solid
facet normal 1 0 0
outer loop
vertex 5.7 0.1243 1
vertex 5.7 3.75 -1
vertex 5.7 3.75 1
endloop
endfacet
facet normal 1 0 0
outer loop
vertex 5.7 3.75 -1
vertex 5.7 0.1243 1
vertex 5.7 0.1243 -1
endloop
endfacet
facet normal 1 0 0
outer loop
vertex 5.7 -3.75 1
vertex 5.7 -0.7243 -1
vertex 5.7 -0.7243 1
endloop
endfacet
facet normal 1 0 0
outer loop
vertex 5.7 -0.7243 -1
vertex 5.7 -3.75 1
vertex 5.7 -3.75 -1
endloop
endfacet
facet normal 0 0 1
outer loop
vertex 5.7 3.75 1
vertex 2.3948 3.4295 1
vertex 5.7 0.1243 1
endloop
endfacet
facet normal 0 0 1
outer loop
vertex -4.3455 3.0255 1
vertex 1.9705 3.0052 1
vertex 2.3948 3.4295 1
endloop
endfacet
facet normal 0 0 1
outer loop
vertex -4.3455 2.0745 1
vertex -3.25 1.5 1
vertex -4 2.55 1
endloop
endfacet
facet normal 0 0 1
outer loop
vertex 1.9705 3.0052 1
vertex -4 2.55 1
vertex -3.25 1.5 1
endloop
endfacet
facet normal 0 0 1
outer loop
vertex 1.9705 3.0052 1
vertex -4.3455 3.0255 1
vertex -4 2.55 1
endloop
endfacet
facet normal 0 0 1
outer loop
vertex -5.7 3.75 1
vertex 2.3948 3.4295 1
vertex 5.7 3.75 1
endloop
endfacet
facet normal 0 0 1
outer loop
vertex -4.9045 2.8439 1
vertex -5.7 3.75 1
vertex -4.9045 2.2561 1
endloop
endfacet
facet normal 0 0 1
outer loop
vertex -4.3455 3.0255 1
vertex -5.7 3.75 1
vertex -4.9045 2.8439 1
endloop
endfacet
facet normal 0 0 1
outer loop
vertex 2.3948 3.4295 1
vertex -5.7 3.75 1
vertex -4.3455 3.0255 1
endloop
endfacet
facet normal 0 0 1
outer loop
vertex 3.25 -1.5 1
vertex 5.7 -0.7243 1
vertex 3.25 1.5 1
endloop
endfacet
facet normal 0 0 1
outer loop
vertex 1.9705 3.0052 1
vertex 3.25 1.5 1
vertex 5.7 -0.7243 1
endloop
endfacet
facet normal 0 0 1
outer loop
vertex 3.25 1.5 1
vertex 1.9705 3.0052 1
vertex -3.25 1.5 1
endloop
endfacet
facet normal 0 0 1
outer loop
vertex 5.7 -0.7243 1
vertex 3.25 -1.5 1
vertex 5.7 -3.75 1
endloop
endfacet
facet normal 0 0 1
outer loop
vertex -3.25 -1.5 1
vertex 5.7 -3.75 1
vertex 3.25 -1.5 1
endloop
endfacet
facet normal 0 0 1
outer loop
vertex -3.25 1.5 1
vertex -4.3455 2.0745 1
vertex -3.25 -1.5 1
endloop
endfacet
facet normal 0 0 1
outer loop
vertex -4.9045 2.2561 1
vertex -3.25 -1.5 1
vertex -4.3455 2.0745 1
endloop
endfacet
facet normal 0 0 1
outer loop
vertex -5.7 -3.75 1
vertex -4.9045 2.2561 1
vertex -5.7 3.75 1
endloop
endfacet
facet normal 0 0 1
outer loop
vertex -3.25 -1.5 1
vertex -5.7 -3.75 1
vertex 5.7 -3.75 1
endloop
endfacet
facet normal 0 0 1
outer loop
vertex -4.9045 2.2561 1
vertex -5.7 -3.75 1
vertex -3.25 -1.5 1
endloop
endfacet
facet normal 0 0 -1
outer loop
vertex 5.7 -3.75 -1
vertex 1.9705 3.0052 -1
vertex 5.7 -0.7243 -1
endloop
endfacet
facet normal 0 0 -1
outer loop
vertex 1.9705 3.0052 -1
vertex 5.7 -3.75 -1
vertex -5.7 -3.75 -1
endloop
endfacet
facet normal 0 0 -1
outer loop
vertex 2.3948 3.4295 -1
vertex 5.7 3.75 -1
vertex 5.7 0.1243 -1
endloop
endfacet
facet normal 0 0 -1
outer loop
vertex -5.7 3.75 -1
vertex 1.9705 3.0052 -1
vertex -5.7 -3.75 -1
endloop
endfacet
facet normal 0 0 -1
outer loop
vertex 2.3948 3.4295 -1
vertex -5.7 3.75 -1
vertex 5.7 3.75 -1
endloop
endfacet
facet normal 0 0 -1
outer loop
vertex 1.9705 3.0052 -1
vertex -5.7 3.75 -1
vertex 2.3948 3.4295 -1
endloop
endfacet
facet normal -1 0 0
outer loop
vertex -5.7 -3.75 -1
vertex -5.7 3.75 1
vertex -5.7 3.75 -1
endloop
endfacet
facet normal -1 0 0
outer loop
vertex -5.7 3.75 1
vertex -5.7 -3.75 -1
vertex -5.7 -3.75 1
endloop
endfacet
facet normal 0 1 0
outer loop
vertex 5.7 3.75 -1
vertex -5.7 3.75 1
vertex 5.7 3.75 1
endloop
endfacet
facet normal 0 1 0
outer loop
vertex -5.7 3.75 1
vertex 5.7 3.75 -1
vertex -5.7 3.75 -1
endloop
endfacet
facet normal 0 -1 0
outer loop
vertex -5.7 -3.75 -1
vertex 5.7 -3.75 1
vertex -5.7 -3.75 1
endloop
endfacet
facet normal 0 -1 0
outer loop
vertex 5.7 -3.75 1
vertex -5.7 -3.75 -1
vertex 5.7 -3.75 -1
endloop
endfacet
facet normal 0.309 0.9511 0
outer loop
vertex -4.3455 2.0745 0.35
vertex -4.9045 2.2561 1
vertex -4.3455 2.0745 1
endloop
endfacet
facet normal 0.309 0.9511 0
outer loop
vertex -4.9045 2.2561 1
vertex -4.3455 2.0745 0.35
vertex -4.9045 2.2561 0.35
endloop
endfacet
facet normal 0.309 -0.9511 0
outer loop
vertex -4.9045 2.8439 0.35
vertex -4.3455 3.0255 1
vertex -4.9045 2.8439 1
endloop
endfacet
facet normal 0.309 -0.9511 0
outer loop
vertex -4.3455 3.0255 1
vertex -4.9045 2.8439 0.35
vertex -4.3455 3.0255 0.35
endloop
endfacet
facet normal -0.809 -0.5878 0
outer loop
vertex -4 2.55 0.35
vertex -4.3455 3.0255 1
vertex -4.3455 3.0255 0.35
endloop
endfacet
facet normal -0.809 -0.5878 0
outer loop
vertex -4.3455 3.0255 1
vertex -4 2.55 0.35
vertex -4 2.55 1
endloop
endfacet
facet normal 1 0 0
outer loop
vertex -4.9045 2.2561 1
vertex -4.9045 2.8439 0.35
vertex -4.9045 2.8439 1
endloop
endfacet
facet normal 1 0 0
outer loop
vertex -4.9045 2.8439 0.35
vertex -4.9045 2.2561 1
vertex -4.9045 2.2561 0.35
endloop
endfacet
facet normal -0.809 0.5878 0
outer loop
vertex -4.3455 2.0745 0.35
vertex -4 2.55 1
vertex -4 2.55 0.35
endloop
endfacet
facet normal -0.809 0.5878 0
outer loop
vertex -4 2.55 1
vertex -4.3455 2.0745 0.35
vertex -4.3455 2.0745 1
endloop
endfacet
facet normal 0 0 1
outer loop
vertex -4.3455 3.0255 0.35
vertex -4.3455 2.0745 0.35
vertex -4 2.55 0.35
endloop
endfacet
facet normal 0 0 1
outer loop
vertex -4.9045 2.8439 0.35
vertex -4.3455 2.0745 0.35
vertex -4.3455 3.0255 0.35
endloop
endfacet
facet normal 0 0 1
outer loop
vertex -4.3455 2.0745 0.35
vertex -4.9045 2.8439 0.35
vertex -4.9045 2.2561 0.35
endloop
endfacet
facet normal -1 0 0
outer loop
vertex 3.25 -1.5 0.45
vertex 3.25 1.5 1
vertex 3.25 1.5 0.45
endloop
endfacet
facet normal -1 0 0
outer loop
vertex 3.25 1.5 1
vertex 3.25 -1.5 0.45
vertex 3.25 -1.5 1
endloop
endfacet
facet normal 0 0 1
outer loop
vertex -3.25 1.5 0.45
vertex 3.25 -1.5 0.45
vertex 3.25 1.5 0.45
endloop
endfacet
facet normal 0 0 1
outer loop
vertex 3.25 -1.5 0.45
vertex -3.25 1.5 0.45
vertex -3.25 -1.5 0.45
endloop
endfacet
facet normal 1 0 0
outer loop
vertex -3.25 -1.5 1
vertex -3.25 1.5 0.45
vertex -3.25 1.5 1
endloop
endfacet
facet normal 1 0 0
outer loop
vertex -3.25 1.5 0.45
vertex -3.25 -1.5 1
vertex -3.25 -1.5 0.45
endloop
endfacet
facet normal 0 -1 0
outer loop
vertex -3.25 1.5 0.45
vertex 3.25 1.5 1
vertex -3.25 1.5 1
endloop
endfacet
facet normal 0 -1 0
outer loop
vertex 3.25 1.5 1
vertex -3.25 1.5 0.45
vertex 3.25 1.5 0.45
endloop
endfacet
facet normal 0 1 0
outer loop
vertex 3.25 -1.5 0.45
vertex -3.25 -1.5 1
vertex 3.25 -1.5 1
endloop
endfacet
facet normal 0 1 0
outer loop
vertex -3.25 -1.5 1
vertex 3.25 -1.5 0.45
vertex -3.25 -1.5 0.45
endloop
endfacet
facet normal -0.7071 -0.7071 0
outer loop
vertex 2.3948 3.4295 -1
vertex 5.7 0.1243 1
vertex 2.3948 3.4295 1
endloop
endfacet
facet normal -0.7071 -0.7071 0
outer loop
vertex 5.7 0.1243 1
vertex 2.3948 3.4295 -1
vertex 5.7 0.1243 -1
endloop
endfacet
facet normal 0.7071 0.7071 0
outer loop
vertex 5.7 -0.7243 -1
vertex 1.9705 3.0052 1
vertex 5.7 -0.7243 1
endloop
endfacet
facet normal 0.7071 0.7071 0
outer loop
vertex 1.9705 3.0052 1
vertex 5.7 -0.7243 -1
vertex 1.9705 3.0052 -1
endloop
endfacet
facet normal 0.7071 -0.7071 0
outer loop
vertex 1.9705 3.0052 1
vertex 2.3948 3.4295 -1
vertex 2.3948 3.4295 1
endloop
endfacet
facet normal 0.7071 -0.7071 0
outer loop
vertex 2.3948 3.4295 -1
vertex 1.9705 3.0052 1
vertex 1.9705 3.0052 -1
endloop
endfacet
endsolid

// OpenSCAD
// Parameters
body_L = 11.4; //[5.7:22.8:0.1]
body_W = 7.5; //[3.75:15:0.1]
body_H = 2; //[1:4:0.05]
overlap = 0.8; //[0.5:2:0.1]
chamfer = 0.6; //[0.2:1.2:0.05]
pin_mark_r = 0.5; //[0.25:1:0.05]
pin_mark_depth = 0.25; //[0.1:0.6:0.05]
pin_mark_inset = 1.2; //[0.6:2.4:0.1]
top_mark_L = 6.5; //[3.25:13:0.1]
top_mark_W = 3.0; //[1.5:6:0.1]
top_mark_depth = 0.15; //[0.05:0.4:0.05]

// Base Shapes
module smd_body() {
  color("DimGray")
  translate([0, 0, 0])
    cube([body_L, body_W, body_H], center=true);
}

module pin_mark() {
  color("Black")
  translate([-body_L/2 + pin_mark_inset, body_W/2 - pin_mark_inset, body_H/2 - pin_mark_depth/2])
    cylinder(r=pin_mark_r, h=pin_mark_depth + overlap, center=true);
}

module top_marking() {
  color("Black")
  translate([0, 0, body_H/2 - top_mark_depth/2])
    cube([top_mark_L, top_mark_W, top_mark_depth + overlap], center=true);
}

module edge_chamfer() {
  color("Black")
  translate([body_L/2 - chamfer/2, 0, 0])
    rotate([0, 0, 45])
      cube([chamfer, body_W + 2*overlap, body_H + 2*overlap], center=true);
}

// Operations
module final_model() {
  difference() {
    smd_body();
    pin_mark();
    top_marking();
    edge_chamfer();
  }
}

// Final Output
final_model();
